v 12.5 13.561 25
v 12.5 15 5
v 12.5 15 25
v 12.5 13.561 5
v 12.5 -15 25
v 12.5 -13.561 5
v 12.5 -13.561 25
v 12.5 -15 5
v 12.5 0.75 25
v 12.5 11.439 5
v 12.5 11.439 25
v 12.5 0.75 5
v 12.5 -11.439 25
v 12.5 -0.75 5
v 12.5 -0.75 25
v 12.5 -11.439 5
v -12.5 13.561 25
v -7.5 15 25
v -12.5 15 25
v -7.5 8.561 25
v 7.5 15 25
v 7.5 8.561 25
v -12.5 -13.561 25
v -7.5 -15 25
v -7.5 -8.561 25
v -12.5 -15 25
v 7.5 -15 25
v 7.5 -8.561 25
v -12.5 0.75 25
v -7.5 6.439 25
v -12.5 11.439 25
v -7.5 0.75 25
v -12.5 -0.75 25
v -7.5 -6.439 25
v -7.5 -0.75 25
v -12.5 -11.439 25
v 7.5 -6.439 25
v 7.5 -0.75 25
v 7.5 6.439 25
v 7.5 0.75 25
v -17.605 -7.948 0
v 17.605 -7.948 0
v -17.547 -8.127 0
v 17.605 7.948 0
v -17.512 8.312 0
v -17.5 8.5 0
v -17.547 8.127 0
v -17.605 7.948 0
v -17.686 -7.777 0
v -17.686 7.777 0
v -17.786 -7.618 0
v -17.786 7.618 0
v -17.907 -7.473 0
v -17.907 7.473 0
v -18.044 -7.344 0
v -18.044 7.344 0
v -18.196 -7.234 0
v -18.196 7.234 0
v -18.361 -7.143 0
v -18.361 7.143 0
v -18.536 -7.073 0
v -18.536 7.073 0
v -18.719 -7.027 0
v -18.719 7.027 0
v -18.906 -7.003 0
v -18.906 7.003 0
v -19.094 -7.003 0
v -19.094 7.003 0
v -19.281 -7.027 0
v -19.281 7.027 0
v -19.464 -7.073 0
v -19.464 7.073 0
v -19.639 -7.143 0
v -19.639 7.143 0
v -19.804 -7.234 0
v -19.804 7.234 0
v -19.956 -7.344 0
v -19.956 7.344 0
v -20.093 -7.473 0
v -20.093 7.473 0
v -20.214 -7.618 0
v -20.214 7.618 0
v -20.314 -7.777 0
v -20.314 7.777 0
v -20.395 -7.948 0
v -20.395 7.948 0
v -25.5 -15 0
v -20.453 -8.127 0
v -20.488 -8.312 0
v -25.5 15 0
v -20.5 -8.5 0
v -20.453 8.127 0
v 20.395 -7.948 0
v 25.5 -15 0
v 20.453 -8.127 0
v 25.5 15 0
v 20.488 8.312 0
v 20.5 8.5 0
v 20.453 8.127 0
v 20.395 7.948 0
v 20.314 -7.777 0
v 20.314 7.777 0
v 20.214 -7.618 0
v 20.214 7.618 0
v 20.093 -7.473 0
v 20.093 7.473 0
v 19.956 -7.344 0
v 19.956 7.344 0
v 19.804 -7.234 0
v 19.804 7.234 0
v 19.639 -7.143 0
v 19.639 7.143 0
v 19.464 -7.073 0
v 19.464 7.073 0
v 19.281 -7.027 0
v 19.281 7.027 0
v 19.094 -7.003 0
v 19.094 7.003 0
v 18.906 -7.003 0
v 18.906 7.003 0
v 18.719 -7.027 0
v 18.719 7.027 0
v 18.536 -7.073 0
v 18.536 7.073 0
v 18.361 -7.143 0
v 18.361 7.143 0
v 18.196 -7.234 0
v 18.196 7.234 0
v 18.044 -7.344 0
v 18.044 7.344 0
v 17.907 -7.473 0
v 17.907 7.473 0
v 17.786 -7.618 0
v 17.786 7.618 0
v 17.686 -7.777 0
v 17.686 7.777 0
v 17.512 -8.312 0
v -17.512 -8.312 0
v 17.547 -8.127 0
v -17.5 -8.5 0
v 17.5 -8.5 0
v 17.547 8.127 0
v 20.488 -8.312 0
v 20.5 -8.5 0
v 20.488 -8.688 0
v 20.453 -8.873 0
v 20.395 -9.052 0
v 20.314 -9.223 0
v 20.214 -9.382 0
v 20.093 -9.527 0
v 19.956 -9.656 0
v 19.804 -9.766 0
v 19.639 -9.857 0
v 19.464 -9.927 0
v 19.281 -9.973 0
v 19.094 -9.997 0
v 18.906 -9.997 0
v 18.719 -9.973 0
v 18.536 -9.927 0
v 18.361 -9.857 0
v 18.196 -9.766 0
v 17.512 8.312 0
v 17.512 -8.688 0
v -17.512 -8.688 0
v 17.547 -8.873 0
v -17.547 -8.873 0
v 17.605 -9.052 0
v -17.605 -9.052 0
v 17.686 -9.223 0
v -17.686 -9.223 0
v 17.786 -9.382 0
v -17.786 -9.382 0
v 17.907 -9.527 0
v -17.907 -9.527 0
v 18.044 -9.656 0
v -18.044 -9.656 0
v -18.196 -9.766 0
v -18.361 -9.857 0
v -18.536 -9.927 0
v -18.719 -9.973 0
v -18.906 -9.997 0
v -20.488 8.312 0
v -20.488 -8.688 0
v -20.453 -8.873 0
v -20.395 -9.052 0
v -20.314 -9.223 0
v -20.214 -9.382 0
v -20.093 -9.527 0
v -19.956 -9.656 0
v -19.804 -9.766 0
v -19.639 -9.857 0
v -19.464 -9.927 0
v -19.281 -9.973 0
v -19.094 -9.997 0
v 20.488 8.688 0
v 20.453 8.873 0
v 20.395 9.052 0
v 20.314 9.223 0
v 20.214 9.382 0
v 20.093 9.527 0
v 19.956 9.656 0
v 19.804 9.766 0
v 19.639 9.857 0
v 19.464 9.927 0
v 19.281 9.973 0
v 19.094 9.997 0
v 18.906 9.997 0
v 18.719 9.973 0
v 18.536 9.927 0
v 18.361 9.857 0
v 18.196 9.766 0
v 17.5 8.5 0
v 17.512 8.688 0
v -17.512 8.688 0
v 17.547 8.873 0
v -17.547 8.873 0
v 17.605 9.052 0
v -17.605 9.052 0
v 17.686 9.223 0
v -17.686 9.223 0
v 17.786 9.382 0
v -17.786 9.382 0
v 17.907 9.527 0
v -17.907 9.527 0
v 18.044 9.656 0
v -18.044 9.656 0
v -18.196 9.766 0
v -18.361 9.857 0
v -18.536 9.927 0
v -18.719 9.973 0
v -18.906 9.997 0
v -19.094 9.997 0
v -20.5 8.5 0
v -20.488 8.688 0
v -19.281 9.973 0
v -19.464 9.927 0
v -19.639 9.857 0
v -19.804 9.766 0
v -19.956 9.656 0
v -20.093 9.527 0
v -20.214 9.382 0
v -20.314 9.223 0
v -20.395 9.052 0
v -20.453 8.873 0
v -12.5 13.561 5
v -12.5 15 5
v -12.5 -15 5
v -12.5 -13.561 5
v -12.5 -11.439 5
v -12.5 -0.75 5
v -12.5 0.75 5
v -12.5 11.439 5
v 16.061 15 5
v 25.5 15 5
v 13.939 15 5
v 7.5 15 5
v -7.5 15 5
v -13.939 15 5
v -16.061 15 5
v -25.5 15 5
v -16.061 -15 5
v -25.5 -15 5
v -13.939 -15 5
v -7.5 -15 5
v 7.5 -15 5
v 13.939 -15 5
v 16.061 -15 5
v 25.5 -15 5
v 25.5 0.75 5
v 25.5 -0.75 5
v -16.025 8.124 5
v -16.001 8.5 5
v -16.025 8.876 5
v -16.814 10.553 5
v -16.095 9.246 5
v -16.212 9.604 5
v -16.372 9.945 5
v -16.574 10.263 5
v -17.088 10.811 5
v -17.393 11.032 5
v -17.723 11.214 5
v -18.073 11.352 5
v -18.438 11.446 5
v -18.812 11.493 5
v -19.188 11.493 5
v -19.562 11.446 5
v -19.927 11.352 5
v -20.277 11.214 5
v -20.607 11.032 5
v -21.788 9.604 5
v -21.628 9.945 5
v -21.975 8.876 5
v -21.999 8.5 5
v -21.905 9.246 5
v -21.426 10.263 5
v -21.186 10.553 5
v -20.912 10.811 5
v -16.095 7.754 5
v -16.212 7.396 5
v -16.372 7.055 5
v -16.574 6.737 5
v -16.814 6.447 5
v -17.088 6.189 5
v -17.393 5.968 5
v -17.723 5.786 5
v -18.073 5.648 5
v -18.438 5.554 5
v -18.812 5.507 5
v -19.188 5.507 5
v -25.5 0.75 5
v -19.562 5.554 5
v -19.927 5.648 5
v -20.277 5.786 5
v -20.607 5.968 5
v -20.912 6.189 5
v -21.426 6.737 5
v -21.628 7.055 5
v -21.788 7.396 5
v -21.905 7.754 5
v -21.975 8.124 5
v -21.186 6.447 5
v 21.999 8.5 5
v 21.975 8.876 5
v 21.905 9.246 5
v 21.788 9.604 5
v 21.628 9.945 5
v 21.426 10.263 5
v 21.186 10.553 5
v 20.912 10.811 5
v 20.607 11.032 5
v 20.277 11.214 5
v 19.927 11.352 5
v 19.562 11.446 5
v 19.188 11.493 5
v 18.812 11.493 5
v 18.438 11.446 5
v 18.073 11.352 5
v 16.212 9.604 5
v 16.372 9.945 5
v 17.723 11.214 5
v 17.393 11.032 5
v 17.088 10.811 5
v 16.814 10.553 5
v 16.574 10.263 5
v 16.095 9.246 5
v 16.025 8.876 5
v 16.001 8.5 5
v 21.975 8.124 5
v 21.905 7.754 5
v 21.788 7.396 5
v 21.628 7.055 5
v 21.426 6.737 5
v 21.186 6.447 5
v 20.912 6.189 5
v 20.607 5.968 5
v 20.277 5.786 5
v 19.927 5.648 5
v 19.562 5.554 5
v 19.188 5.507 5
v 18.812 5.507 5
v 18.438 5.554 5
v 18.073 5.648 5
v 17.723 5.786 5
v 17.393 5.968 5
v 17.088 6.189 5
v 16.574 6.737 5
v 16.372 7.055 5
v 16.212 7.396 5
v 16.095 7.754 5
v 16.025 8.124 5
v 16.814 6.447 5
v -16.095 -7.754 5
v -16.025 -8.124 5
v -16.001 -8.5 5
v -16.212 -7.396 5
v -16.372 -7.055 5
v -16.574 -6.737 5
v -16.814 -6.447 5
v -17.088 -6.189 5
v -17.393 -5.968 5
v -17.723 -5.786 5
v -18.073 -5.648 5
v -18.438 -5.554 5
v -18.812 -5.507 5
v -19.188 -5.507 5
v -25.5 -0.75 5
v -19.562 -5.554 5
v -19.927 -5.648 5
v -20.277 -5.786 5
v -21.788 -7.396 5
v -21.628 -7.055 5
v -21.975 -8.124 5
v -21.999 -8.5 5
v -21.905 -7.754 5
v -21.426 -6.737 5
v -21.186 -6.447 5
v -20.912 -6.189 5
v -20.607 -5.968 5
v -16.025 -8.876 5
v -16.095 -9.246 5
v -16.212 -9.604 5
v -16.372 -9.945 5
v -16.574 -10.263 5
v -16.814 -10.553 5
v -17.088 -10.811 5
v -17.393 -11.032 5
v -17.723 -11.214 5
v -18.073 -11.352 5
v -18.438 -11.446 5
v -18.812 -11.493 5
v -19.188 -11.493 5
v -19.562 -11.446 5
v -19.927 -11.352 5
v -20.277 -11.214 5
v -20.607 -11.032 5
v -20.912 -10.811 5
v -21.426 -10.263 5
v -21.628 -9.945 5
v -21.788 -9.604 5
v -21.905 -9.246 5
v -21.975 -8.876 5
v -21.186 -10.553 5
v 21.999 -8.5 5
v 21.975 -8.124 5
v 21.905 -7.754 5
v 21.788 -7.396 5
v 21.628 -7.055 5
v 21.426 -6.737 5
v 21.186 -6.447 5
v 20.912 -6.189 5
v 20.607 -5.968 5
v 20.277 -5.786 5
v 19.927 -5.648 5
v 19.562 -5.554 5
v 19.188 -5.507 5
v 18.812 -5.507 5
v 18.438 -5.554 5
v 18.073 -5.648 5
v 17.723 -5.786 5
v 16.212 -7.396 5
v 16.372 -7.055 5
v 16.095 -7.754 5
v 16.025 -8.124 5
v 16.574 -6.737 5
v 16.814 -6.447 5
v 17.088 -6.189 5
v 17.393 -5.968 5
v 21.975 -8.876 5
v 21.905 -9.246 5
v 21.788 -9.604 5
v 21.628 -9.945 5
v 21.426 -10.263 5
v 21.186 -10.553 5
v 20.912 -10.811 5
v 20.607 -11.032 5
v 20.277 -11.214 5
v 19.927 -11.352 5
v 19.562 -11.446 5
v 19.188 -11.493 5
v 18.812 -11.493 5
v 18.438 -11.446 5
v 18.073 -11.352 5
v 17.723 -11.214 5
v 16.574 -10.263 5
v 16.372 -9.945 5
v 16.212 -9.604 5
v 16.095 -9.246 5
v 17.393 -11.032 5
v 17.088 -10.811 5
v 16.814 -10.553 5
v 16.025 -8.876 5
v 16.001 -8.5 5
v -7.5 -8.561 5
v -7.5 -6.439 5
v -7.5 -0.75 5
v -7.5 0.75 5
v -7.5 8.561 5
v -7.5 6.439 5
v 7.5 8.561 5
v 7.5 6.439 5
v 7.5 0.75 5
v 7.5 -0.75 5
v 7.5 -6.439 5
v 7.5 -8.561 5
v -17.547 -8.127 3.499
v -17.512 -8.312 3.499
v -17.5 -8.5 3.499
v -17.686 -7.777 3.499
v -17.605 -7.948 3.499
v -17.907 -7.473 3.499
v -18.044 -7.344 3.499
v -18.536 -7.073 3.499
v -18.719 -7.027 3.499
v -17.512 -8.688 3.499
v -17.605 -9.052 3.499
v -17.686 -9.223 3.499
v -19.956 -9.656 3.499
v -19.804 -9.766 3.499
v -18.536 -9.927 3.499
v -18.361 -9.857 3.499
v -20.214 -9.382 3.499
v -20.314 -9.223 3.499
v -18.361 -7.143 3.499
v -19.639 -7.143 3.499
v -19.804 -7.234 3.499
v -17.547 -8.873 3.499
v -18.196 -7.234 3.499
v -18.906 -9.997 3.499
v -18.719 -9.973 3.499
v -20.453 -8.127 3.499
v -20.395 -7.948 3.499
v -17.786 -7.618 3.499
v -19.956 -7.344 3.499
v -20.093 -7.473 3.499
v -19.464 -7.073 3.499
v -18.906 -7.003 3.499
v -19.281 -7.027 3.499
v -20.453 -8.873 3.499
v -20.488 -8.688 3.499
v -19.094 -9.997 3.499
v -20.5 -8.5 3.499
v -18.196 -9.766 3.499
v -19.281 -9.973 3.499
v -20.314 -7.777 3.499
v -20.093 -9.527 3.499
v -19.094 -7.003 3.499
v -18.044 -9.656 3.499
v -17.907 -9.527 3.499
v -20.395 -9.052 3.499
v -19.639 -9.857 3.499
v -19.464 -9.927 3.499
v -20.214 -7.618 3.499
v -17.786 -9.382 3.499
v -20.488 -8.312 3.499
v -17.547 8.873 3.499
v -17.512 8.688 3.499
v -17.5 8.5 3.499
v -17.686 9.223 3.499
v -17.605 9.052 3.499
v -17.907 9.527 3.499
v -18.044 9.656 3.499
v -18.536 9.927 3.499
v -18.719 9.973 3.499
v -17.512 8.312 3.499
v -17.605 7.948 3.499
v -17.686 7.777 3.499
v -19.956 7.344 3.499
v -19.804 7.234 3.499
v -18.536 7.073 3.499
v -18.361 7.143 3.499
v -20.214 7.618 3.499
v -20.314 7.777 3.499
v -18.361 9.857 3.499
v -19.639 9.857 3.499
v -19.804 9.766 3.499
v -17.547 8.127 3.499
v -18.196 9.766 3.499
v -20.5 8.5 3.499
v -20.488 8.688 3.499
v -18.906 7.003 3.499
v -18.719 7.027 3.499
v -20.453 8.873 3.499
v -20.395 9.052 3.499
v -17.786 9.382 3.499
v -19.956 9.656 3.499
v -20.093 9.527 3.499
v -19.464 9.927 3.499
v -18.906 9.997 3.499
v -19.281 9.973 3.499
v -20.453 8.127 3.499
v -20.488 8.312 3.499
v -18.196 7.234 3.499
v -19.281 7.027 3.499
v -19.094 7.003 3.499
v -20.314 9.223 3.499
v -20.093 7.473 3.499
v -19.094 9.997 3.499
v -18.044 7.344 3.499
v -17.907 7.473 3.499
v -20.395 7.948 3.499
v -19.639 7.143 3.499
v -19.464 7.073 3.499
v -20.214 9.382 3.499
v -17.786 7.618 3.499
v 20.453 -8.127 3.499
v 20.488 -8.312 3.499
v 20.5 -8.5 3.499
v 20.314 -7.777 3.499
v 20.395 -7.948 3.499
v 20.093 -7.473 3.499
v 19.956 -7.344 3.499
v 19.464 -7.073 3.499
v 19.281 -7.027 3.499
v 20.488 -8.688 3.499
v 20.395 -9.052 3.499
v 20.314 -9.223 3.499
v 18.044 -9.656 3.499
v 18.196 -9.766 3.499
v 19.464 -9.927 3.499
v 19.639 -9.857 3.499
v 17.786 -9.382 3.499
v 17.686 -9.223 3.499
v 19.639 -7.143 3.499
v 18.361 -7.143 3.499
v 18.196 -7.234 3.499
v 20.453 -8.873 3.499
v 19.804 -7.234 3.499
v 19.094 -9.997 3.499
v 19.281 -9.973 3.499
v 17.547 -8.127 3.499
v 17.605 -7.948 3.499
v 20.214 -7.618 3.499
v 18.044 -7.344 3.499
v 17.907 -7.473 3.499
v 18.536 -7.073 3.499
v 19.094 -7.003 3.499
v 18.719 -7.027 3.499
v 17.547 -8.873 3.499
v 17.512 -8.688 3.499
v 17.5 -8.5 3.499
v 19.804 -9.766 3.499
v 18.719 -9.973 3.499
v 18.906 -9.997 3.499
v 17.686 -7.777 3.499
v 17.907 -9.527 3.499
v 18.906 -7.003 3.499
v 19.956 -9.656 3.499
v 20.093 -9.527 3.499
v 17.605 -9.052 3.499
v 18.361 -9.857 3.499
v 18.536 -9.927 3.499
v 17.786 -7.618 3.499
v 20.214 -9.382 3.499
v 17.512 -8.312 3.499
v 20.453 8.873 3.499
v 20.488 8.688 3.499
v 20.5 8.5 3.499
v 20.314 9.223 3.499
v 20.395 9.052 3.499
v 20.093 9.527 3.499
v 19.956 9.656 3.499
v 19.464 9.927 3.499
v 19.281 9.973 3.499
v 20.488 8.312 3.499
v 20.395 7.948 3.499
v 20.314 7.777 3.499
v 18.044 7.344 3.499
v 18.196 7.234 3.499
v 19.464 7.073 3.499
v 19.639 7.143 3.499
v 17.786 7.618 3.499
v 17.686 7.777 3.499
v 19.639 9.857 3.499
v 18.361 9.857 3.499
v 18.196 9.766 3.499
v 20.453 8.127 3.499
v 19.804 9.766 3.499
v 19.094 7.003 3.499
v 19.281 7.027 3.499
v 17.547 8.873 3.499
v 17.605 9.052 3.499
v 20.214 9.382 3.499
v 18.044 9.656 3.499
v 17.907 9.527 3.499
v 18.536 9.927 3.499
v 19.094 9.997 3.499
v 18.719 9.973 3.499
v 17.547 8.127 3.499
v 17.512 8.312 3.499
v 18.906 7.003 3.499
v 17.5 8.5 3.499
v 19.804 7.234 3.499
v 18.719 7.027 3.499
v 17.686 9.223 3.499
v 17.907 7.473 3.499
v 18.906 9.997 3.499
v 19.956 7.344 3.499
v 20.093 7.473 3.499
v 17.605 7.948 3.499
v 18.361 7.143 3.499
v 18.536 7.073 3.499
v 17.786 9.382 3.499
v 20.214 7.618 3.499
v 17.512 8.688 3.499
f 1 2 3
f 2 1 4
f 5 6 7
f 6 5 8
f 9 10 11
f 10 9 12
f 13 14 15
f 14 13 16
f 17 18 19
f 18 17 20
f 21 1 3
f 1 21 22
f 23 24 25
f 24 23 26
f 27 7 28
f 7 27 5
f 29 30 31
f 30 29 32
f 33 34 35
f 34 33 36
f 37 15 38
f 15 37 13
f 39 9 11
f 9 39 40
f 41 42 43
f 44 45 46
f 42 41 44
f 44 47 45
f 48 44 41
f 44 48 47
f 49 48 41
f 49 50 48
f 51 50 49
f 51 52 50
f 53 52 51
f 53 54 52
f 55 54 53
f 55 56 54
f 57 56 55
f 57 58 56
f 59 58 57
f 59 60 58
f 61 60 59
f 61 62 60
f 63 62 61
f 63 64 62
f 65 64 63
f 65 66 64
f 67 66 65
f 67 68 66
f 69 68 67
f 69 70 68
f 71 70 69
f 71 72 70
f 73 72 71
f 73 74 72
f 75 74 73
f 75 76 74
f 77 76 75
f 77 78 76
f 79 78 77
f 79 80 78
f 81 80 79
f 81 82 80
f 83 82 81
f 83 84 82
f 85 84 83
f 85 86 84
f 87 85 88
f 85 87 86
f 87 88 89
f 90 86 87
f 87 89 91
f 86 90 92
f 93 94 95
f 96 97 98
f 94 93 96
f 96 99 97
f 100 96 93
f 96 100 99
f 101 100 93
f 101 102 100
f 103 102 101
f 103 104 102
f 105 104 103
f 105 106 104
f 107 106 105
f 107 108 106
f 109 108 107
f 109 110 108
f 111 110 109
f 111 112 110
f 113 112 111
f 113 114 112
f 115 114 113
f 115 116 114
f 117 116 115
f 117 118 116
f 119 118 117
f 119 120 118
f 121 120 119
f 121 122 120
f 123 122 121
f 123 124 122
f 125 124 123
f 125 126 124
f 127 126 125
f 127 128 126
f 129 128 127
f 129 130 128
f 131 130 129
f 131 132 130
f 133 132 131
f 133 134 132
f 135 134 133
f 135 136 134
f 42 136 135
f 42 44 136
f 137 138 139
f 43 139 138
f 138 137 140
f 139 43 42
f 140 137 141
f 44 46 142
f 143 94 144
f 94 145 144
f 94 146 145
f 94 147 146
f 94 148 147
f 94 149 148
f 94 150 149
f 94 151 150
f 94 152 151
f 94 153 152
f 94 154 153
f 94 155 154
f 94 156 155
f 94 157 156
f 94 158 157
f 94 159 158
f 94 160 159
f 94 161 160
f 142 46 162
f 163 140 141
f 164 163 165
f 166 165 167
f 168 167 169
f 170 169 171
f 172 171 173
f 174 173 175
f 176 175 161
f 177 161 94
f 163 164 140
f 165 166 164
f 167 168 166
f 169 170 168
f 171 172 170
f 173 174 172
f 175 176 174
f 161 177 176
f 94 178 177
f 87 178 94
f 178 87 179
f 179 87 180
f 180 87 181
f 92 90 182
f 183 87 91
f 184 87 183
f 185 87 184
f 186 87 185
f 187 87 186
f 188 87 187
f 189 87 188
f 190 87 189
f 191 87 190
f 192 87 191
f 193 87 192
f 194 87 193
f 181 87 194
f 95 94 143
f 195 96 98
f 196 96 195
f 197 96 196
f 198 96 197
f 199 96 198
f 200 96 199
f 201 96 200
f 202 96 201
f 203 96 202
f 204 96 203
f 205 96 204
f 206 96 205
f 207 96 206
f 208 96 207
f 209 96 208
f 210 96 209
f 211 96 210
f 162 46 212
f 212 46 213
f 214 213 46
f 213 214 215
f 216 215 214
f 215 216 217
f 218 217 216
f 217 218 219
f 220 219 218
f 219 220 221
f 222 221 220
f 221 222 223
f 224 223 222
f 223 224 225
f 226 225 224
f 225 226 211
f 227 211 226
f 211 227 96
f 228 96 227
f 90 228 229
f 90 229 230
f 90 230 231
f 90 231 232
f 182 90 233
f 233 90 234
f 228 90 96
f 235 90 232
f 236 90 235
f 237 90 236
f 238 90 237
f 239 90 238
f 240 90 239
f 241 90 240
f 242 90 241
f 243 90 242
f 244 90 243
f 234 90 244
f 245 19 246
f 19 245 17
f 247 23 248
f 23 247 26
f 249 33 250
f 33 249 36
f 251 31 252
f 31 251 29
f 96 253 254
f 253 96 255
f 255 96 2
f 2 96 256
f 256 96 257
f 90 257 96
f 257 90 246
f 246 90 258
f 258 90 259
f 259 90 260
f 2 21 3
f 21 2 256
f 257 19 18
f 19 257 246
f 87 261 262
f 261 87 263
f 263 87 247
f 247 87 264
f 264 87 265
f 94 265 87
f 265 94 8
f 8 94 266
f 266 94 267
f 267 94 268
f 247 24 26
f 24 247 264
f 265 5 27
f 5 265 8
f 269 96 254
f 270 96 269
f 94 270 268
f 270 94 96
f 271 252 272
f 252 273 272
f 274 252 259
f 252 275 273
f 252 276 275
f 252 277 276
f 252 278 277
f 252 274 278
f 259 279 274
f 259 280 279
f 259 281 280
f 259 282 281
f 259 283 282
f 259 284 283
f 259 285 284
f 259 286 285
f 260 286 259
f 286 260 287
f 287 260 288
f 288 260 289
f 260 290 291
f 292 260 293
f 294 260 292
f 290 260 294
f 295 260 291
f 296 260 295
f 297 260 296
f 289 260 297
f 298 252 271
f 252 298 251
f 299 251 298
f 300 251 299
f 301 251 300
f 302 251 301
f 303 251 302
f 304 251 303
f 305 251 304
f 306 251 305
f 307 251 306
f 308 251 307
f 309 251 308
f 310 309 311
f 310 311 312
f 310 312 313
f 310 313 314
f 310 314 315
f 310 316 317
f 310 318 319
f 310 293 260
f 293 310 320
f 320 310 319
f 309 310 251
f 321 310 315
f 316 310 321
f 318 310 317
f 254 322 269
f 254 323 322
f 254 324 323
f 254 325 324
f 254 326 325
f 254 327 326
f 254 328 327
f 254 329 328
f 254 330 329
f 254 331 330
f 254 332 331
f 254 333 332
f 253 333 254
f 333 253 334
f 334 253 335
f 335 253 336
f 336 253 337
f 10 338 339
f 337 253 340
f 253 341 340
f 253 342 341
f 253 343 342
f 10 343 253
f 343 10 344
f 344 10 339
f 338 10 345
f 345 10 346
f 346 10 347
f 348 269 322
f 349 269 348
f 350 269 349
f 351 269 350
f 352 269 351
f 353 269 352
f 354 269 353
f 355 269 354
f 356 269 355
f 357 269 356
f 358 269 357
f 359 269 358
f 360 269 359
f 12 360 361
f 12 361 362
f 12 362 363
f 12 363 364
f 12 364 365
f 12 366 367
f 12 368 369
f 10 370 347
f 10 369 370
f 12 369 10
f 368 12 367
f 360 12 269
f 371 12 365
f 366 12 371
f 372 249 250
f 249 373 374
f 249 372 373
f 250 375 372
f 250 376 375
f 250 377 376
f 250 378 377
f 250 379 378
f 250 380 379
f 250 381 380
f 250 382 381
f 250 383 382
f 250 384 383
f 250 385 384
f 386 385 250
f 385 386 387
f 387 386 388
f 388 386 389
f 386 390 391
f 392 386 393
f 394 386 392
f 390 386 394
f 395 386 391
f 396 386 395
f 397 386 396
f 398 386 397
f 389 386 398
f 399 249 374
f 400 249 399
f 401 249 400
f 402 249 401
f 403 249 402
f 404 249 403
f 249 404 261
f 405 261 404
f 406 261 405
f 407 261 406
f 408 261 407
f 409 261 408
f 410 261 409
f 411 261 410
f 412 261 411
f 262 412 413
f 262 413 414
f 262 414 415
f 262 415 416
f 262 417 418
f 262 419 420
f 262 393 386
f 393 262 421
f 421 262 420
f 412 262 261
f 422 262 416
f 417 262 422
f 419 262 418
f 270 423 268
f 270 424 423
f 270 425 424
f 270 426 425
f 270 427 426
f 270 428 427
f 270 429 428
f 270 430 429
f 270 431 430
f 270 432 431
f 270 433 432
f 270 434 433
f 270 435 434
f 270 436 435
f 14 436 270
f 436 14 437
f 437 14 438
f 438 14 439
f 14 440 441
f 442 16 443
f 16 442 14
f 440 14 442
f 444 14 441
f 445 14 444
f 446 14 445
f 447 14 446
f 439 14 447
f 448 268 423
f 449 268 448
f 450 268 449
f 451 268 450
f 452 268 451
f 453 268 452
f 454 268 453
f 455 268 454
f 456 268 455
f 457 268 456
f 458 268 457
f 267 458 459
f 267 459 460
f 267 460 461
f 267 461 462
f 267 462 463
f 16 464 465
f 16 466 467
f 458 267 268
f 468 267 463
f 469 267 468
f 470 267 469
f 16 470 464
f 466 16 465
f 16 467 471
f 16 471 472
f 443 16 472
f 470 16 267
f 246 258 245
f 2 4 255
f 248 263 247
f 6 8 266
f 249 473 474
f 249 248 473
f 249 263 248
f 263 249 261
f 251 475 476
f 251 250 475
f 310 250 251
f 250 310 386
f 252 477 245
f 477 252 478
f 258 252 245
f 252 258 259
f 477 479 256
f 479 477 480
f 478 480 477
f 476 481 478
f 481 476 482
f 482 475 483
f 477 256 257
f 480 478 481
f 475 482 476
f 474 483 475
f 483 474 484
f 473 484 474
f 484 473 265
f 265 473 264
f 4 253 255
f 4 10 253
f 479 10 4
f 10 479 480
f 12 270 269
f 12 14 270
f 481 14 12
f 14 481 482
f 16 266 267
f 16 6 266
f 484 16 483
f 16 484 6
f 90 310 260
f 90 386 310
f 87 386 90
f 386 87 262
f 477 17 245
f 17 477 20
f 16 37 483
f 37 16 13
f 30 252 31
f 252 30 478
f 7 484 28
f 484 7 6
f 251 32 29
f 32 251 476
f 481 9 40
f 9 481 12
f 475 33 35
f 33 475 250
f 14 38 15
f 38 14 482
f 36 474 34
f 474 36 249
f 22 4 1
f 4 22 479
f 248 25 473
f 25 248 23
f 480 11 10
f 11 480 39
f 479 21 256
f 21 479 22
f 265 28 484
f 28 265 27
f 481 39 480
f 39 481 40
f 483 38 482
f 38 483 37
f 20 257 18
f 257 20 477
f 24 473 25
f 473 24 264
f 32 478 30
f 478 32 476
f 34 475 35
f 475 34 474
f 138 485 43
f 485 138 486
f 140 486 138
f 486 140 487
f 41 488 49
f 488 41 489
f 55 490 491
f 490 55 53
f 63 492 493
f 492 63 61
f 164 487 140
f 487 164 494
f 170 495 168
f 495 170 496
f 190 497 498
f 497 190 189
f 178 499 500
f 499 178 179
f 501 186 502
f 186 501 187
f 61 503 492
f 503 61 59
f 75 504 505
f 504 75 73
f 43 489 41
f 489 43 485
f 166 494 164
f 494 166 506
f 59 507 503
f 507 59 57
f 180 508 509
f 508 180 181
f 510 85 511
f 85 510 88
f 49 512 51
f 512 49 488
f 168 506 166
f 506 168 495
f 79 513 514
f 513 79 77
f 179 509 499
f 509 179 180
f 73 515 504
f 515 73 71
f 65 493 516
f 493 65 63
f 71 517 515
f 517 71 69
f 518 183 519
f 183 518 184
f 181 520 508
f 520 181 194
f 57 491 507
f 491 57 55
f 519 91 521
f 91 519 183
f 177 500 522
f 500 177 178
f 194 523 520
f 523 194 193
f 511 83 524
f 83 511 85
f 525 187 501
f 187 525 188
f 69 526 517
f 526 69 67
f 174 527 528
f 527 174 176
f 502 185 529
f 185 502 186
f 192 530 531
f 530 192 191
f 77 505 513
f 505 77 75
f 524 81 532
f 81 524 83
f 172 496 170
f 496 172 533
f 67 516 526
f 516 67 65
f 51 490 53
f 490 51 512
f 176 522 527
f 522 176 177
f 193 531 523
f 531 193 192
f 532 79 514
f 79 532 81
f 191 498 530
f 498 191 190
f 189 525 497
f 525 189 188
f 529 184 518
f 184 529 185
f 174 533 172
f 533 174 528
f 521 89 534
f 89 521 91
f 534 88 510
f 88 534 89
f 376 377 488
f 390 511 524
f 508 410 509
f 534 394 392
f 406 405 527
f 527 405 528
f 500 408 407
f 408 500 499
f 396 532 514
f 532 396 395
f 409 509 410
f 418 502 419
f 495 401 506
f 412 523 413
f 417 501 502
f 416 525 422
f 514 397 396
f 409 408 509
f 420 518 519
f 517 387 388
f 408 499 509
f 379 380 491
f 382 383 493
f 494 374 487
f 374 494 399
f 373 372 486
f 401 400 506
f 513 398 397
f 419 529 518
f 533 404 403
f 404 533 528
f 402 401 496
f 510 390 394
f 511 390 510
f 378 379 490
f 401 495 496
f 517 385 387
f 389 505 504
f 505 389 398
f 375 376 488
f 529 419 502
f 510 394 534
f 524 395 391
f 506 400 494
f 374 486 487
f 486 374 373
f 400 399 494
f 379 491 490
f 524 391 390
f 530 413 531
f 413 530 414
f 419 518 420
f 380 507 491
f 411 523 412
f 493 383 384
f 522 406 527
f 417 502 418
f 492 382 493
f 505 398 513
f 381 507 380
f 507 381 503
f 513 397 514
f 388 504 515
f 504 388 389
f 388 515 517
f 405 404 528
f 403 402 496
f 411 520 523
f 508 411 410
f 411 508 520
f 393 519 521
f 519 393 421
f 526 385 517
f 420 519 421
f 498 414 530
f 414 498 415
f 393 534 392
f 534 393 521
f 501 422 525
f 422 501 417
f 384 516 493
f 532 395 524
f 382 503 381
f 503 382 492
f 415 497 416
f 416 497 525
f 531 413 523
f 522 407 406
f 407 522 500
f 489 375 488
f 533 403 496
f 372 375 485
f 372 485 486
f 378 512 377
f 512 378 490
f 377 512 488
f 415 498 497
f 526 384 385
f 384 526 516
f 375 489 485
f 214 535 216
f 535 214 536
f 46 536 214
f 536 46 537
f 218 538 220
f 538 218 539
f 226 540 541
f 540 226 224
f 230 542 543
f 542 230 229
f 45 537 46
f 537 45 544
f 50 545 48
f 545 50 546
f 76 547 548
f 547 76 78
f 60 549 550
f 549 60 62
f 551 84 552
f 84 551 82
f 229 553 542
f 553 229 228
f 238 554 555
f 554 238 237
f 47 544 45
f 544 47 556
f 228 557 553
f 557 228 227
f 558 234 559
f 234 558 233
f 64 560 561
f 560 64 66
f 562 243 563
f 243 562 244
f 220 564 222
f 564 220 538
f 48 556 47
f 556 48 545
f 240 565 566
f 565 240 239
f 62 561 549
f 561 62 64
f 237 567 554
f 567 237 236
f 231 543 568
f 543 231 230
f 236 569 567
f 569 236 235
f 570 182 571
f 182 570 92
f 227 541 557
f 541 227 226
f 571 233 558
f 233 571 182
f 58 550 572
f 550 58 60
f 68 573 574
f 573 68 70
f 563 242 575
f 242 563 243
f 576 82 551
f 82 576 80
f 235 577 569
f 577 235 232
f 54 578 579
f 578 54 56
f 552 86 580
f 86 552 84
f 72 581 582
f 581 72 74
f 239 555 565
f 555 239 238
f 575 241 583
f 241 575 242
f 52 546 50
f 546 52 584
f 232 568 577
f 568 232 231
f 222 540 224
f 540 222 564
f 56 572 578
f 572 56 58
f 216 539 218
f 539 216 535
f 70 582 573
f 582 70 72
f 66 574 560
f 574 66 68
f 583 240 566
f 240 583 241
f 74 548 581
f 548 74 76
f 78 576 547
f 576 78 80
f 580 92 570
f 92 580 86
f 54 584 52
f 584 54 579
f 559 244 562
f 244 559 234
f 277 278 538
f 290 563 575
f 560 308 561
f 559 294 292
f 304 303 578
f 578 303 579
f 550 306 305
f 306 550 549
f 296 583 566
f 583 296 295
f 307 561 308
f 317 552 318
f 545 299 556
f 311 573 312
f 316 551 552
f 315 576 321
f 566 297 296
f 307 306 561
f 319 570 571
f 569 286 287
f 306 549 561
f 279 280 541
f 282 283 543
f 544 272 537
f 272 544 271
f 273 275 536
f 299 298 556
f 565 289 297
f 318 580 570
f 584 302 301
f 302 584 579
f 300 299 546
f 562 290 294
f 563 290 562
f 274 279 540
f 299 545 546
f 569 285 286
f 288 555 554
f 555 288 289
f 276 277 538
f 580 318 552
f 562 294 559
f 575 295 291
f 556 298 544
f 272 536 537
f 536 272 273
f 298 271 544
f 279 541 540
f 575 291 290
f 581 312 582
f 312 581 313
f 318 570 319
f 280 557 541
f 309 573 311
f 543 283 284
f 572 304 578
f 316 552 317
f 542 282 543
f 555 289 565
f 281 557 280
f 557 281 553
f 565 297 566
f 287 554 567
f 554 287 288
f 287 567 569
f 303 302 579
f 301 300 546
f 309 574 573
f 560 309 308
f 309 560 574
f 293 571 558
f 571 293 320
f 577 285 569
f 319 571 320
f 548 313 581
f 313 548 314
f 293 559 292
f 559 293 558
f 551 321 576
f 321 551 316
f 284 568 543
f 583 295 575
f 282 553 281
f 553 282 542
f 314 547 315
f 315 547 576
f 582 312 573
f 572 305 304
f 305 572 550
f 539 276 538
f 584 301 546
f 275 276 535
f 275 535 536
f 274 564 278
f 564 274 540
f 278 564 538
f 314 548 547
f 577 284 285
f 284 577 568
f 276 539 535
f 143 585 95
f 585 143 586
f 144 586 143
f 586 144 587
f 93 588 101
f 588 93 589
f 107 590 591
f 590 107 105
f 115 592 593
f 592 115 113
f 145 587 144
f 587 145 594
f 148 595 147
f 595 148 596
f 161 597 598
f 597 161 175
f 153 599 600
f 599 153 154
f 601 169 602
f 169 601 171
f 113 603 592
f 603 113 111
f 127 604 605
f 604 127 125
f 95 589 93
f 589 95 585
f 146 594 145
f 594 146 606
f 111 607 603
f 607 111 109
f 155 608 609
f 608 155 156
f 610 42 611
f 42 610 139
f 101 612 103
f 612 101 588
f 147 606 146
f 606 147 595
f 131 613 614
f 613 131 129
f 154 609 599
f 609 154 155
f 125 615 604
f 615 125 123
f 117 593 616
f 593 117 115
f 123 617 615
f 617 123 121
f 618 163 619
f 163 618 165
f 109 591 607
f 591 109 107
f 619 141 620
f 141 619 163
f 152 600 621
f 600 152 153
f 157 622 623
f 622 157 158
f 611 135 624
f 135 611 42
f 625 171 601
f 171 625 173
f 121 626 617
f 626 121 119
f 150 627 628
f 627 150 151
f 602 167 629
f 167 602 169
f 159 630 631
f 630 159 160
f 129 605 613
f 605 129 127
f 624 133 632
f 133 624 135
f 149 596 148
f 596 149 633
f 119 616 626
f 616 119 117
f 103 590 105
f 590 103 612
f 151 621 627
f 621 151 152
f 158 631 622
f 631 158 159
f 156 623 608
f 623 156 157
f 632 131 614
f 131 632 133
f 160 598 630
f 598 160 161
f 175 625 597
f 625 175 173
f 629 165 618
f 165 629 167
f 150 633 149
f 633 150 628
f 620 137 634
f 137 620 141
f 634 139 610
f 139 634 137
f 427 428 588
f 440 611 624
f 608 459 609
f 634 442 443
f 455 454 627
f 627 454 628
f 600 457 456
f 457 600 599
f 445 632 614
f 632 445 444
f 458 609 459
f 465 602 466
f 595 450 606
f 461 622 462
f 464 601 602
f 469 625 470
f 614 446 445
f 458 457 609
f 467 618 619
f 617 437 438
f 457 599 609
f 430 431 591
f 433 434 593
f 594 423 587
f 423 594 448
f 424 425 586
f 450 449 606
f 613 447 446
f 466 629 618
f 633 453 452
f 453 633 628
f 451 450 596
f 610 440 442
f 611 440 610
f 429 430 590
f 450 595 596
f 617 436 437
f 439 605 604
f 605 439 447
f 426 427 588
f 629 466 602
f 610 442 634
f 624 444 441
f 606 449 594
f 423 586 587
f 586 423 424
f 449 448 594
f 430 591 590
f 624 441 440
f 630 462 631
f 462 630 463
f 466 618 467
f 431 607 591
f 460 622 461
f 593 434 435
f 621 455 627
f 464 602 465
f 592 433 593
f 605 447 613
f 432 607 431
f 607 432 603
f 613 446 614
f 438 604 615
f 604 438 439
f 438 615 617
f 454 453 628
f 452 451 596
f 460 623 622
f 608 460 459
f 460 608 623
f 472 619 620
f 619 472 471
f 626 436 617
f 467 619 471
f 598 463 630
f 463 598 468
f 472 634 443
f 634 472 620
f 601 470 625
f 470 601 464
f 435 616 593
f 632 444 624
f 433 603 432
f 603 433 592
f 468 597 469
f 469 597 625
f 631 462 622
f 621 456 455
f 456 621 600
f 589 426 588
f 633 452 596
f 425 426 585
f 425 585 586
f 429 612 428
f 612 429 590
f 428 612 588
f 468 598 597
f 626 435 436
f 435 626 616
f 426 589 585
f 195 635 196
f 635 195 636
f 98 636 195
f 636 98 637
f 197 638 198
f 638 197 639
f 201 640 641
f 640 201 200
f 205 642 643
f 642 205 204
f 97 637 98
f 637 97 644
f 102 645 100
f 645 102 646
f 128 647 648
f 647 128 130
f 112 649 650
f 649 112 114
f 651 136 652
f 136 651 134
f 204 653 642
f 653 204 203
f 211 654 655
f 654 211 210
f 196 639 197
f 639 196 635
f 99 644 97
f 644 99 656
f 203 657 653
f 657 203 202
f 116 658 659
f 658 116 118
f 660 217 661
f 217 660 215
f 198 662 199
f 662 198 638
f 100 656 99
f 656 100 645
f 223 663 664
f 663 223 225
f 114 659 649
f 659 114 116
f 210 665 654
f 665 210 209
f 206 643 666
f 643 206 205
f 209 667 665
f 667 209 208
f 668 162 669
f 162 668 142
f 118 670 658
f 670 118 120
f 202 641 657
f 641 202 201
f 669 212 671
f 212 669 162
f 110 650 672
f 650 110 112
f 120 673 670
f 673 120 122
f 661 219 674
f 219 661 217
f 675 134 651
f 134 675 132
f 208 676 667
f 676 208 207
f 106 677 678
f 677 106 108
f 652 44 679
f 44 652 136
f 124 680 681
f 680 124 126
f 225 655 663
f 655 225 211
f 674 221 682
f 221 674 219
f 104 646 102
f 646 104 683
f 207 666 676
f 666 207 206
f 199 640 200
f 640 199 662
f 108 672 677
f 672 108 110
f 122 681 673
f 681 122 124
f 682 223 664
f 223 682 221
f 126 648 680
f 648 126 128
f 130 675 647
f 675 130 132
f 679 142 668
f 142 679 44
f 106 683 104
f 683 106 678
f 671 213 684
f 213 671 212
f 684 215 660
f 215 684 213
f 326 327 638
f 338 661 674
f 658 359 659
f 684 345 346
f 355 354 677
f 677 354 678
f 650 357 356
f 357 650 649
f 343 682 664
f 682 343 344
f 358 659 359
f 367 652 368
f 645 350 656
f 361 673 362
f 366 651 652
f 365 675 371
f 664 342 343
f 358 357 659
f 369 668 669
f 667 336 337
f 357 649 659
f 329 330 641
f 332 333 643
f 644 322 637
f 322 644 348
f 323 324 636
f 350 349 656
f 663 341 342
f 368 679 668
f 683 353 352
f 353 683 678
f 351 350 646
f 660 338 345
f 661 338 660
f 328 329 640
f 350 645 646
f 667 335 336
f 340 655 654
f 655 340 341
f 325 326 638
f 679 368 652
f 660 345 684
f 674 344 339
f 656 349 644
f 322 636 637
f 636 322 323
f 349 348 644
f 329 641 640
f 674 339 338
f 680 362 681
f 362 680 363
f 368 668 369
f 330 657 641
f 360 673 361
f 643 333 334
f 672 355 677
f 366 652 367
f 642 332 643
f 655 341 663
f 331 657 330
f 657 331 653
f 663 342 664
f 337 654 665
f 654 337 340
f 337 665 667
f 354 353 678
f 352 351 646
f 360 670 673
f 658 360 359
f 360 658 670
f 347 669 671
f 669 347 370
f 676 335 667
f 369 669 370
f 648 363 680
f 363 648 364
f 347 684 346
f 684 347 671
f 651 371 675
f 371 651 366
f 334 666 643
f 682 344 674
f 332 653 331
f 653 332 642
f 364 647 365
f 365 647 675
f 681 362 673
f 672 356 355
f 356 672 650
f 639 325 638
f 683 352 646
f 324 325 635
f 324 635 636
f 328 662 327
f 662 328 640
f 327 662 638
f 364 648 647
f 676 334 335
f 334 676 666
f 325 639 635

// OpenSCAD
$fn = 50;

width = 15;
length = 30;
height = 20;
extraBaseWidth = 13;

wallThickness = 5;
slitWidth = 1.5;

screwRadius = 1.5;

miter();

module miter()
{
    difference()
    {
        union()
        {
            centerCube(width + 2 * wallThickness, length, wallThickness + height);
            centerCube(width + 2 * wallThickness + 2 * extraBaseWidth, length, wallThickness);
        }
        translate([0, 0, wallThickness])
        {
            centerCube(width, length + 0.1, height + 0.1);
            for(i = [-1:1:1])
            {
                rotate([0, 0, i * 45])
                {
                    centerCube(width + length + 2 * wallThickness + 0.1, slitWidth, height + 0.1);
                }
            }
        }
        for(i = [-1:2:1])
        {
            for(j = [-1:2:1])
            {
                translate([i * (width / 2 + wallThickness + extraBaseWidth / 2), j * (length / 2 - extraBaseWidth / 2), -0.1])
                {
                    cylinder(r = screwRadius, h = wallThickness - screwRadius + 0.1);
                    translate([0, 0, wallThickness - screwRadius + 0.1 - 0.001])
                    {
                        cylinder(r1 = screwRadius, r2 = 2 * screwRadius, h = screwRadius + 0.002);
                    }
                }
            }
        }
    }
}

module centerCube(x, y, z)
{
    translate([-x / 2, -y / 2, 0])
    {
        cube([x, y, z]);
    }
}
